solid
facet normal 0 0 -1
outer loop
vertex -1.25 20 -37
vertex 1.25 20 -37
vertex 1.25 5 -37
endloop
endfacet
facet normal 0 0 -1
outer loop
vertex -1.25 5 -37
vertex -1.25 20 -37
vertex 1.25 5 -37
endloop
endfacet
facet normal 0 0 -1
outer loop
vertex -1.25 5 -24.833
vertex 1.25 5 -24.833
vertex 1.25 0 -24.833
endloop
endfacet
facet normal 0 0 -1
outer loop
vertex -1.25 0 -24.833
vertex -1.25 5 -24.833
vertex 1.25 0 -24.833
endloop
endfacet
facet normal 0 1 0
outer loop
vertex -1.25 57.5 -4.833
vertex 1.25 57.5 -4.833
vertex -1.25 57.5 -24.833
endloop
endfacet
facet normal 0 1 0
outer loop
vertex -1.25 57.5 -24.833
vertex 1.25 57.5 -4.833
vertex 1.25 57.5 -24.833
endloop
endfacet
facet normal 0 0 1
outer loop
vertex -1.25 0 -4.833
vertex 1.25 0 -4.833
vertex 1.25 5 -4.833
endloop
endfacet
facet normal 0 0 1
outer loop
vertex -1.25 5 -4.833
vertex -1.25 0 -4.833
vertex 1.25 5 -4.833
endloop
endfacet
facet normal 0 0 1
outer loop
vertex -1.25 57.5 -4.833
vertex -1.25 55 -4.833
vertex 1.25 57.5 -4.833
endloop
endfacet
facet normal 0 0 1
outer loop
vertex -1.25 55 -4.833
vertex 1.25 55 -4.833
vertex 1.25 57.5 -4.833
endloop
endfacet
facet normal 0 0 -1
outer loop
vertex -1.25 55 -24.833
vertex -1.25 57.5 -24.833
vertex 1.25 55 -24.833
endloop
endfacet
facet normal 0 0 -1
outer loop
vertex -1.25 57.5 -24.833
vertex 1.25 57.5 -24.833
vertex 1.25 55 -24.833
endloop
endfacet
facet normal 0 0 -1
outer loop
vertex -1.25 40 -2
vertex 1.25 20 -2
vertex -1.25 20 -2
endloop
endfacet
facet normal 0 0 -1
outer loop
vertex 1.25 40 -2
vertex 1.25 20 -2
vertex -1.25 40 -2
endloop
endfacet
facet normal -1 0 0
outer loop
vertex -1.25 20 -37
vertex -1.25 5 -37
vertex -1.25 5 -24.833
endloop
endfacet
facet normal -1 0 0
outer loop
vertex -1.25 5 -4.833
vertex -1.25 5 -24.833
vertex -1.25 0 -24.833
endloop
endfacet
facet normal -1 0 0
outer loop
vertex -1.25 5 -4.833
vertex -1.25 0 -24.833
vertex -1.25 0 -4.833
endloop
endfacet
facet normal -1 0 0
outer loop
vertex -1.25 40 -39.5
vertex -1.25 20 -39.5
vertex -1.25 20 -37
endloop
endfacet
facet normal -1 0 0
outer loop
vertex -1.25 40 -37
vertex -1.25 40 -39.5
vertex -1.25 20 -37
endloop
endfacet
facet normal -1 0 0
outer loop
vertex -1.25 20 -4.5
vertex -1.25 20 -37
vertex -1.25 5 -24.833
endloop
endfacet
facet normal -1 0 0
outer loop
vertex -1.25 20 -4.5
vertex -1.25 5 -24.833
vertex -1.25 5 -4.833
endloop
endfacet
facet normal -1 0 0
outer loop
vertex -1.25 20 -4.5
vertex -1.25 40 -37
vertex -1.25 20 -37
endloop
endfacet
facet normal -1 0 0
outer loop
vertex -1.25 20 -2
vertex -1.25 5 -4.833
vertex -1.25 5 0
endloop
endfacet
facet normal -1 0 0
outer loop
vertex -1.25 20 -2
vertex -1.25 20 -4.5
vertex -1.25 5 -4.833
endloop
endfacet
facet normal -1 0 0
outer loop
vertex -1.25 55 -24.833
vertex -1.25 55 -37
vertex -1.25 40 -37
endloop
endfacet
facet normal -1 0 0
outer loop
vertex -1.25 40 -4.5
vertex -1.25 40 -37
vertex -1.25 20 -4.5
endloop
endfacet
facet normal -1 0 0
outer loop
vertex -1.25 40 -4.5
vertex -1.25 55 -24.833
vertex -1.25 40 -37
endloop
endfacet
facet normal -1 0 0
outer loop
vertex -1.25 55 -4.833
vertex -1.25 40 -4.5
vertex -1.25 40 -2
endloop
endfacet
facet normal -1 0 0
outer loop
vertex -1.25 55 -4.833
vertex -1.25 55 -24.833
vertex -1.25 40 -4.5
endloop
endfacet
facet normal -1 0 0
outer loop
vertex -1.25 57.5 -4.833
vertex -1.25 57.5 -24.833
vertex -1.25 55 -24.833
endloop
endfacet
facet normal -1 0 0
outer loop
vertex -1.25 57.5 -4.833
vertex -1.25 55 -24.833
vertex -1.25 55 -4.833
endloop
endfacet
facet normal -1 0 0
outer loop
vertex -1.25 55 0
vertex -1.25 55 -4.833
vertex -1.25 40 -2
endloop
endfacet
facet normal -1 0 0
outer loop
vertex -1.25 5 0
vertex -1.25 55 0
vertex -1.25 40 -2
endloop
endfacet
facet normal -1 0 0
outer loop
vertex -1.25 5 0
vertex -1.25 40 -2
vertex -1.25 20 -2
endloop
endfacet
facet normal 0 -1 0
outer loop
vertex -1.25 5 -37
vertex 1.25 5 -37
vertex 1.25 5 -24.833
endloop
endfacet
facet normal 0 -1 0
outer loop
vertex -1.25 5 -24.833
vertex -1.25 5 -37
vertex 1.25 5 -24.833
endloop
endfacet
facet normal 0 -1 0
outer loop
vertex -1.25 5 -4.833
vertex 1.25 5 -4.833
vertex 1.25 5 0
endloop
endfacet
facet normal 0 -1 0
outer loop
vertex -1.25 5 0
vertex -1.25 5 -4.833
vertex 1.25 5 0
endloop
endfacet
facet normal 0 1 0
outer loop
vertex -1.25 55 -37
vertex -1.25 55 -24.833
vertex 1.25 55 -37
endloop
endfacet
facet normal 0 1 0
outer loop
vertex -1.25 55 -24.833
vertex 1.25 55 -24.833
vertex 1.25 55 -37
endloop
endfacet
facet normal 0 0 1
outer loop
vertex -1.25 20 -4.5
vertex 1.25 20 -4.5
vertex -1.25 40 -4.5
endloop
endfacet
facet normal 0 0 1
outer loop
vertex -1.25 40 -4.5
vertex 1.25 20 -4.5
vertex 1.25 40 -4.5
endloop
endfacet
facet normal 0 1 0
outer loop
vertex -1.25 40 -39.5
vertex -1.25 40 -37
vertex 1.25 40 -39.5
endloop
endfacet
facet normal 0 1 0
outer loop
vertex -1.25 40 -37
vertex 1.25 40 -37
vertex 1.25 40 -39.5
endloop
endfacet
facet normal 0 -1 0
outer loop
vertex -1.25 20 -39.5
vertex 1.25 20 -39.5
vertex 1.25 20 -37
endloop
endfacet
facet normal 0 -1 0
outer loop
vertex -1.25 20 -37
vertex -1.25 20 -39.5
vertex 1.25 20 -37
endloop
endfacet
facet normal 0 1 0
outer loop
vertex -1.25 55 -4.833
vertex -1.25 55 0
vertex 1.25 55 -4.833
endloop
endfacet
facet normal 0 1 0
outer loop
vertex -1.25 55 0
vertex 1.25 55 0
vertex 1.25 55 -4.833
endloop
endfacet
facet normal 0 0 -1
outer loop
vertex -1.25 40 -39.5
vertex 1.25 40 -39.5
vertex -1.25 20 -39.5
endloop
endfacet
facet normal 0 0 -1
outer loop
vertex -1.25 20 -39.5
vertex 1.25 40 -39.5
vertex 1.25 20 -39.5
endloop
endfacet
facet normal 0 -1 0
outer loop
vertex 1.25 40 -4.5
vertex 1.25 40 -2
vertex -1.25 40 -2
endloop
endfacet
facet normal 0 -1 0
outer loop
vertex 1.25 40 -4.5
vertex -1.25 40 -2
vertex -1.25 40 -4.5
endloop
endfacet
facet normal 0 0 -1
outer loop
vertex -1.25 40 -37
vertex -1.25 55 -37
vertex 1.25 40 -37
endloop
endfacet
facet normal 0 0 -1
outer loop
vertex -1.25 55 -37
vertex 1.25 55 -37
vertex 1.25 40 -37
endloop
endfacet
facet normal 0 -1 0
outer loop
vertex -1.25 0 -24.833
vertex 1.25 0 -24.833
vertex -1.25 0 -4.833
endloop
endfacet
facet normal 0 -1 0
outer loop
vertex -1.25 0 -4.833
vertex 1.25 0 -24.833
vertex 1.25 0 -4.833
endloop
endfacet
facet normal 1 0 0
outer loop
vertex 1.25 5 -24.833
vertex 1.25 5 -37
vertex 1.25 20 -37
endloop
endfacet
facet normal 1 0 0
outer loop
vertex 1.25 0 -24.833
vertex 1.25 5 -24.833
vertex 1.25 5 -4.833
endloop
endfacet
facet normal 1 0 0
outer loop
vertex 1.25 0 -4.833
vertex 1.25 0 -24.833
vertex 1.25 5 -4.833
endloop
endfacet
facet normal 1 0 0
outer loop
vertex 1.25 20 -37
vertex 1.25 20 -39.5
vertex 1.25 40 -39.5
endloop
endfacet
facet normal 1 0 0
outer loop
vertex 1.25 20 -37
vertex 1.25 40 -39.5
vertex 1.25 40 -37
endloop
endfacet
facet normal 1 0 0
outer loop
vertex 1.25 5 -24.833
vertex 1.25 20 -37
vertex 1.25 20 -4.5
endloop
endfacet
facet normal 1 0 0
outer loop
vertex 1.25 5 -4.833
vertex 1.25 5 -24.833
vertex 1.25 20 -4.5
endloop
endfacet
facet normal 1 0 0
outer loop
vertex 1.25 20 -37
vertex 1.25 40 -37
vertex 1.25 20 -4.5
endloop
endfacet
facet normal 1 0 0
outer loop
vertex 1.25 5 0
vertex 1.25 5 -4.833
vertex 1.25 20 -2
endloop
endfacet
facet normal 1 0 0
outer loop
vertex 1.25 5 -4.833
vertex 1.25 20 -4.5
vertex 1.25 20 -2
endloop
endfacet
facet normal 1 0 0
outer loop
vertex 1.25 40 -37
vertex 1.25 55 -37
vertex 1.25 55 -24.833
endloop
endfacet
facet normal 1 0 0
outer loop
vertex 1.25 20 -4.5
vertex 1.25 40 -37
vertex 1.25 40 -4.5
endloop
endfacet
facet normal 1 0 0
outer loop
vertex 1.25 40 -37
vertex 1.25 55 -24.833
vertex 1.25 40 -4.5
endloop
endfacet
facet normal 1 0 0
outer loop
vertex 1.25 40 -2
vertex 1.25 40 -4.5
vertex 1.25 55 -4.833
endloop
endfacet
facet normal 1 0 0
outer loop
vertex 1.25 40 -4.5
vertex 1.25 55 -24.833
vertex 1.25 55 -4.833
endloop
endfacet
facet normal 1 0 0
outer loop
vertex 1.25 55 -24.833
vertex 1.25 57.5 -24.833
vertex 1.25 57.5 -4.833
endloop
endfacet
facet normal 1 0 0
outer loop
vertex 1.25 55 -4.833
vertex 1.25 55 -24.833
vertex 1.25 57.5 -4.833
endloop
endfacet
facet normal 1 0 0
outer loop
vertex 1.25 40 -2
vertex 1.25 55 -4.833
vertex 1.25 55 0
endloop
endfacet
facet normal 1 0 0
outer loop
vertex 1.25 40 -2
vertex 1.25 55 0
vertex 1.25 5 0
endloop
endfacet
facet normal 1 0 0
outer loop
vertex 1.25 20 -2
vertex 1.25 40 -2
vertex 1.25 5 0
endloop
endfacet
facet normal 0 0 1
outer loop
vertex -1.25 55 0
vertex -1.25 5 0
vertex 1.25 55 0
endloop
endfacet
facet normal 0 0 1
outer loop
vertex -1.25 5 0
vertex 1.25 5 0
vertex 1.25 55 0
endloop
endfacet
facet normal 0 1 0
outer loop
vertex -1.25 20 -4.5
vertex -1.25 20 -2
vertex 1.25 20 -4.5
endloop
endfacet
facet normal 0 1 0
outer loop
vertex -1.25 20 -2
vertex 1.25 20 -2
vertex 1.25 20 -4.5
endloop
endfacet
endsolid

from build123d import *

# Parameters (mm, degrees)
SKETCH1_W           = 2.5
SKETCH1_H           = 20
BOSS_EXTRUDE2_DEPTH = 1.25


with BuildPart() as part:
    # Sketch1 (on Right Plane) → Boss-Extrude2 (new, symmetric)
    with BuildSketch(Plane(origin=(0, 0, 0), x_dir=(0, 0, -1), z_dir=(1, 0, 0))):
        Polygon((4.833333333, 5), (0, 5), (0, 55), (4.833333333, 55), (4.833333333, 57.5), (24.833333333, 57.5), (24.833333333, 55), (37, 55), (37, 40), (39.5, 40), (39.5, 20), (37, 20), (37, 5), (24.833333333, 5), (24.833333333, 0), (4.833333333, 0), align=None)
        with Locations((3.25, 30)):
            Rectangle(SKETCH1_W, SKETCH1_H, mode=Mode.SUBTRACT)
    extrude(amount=BOSS_EXTRUDE2_DEPTH, both=True)


solid = part.part
